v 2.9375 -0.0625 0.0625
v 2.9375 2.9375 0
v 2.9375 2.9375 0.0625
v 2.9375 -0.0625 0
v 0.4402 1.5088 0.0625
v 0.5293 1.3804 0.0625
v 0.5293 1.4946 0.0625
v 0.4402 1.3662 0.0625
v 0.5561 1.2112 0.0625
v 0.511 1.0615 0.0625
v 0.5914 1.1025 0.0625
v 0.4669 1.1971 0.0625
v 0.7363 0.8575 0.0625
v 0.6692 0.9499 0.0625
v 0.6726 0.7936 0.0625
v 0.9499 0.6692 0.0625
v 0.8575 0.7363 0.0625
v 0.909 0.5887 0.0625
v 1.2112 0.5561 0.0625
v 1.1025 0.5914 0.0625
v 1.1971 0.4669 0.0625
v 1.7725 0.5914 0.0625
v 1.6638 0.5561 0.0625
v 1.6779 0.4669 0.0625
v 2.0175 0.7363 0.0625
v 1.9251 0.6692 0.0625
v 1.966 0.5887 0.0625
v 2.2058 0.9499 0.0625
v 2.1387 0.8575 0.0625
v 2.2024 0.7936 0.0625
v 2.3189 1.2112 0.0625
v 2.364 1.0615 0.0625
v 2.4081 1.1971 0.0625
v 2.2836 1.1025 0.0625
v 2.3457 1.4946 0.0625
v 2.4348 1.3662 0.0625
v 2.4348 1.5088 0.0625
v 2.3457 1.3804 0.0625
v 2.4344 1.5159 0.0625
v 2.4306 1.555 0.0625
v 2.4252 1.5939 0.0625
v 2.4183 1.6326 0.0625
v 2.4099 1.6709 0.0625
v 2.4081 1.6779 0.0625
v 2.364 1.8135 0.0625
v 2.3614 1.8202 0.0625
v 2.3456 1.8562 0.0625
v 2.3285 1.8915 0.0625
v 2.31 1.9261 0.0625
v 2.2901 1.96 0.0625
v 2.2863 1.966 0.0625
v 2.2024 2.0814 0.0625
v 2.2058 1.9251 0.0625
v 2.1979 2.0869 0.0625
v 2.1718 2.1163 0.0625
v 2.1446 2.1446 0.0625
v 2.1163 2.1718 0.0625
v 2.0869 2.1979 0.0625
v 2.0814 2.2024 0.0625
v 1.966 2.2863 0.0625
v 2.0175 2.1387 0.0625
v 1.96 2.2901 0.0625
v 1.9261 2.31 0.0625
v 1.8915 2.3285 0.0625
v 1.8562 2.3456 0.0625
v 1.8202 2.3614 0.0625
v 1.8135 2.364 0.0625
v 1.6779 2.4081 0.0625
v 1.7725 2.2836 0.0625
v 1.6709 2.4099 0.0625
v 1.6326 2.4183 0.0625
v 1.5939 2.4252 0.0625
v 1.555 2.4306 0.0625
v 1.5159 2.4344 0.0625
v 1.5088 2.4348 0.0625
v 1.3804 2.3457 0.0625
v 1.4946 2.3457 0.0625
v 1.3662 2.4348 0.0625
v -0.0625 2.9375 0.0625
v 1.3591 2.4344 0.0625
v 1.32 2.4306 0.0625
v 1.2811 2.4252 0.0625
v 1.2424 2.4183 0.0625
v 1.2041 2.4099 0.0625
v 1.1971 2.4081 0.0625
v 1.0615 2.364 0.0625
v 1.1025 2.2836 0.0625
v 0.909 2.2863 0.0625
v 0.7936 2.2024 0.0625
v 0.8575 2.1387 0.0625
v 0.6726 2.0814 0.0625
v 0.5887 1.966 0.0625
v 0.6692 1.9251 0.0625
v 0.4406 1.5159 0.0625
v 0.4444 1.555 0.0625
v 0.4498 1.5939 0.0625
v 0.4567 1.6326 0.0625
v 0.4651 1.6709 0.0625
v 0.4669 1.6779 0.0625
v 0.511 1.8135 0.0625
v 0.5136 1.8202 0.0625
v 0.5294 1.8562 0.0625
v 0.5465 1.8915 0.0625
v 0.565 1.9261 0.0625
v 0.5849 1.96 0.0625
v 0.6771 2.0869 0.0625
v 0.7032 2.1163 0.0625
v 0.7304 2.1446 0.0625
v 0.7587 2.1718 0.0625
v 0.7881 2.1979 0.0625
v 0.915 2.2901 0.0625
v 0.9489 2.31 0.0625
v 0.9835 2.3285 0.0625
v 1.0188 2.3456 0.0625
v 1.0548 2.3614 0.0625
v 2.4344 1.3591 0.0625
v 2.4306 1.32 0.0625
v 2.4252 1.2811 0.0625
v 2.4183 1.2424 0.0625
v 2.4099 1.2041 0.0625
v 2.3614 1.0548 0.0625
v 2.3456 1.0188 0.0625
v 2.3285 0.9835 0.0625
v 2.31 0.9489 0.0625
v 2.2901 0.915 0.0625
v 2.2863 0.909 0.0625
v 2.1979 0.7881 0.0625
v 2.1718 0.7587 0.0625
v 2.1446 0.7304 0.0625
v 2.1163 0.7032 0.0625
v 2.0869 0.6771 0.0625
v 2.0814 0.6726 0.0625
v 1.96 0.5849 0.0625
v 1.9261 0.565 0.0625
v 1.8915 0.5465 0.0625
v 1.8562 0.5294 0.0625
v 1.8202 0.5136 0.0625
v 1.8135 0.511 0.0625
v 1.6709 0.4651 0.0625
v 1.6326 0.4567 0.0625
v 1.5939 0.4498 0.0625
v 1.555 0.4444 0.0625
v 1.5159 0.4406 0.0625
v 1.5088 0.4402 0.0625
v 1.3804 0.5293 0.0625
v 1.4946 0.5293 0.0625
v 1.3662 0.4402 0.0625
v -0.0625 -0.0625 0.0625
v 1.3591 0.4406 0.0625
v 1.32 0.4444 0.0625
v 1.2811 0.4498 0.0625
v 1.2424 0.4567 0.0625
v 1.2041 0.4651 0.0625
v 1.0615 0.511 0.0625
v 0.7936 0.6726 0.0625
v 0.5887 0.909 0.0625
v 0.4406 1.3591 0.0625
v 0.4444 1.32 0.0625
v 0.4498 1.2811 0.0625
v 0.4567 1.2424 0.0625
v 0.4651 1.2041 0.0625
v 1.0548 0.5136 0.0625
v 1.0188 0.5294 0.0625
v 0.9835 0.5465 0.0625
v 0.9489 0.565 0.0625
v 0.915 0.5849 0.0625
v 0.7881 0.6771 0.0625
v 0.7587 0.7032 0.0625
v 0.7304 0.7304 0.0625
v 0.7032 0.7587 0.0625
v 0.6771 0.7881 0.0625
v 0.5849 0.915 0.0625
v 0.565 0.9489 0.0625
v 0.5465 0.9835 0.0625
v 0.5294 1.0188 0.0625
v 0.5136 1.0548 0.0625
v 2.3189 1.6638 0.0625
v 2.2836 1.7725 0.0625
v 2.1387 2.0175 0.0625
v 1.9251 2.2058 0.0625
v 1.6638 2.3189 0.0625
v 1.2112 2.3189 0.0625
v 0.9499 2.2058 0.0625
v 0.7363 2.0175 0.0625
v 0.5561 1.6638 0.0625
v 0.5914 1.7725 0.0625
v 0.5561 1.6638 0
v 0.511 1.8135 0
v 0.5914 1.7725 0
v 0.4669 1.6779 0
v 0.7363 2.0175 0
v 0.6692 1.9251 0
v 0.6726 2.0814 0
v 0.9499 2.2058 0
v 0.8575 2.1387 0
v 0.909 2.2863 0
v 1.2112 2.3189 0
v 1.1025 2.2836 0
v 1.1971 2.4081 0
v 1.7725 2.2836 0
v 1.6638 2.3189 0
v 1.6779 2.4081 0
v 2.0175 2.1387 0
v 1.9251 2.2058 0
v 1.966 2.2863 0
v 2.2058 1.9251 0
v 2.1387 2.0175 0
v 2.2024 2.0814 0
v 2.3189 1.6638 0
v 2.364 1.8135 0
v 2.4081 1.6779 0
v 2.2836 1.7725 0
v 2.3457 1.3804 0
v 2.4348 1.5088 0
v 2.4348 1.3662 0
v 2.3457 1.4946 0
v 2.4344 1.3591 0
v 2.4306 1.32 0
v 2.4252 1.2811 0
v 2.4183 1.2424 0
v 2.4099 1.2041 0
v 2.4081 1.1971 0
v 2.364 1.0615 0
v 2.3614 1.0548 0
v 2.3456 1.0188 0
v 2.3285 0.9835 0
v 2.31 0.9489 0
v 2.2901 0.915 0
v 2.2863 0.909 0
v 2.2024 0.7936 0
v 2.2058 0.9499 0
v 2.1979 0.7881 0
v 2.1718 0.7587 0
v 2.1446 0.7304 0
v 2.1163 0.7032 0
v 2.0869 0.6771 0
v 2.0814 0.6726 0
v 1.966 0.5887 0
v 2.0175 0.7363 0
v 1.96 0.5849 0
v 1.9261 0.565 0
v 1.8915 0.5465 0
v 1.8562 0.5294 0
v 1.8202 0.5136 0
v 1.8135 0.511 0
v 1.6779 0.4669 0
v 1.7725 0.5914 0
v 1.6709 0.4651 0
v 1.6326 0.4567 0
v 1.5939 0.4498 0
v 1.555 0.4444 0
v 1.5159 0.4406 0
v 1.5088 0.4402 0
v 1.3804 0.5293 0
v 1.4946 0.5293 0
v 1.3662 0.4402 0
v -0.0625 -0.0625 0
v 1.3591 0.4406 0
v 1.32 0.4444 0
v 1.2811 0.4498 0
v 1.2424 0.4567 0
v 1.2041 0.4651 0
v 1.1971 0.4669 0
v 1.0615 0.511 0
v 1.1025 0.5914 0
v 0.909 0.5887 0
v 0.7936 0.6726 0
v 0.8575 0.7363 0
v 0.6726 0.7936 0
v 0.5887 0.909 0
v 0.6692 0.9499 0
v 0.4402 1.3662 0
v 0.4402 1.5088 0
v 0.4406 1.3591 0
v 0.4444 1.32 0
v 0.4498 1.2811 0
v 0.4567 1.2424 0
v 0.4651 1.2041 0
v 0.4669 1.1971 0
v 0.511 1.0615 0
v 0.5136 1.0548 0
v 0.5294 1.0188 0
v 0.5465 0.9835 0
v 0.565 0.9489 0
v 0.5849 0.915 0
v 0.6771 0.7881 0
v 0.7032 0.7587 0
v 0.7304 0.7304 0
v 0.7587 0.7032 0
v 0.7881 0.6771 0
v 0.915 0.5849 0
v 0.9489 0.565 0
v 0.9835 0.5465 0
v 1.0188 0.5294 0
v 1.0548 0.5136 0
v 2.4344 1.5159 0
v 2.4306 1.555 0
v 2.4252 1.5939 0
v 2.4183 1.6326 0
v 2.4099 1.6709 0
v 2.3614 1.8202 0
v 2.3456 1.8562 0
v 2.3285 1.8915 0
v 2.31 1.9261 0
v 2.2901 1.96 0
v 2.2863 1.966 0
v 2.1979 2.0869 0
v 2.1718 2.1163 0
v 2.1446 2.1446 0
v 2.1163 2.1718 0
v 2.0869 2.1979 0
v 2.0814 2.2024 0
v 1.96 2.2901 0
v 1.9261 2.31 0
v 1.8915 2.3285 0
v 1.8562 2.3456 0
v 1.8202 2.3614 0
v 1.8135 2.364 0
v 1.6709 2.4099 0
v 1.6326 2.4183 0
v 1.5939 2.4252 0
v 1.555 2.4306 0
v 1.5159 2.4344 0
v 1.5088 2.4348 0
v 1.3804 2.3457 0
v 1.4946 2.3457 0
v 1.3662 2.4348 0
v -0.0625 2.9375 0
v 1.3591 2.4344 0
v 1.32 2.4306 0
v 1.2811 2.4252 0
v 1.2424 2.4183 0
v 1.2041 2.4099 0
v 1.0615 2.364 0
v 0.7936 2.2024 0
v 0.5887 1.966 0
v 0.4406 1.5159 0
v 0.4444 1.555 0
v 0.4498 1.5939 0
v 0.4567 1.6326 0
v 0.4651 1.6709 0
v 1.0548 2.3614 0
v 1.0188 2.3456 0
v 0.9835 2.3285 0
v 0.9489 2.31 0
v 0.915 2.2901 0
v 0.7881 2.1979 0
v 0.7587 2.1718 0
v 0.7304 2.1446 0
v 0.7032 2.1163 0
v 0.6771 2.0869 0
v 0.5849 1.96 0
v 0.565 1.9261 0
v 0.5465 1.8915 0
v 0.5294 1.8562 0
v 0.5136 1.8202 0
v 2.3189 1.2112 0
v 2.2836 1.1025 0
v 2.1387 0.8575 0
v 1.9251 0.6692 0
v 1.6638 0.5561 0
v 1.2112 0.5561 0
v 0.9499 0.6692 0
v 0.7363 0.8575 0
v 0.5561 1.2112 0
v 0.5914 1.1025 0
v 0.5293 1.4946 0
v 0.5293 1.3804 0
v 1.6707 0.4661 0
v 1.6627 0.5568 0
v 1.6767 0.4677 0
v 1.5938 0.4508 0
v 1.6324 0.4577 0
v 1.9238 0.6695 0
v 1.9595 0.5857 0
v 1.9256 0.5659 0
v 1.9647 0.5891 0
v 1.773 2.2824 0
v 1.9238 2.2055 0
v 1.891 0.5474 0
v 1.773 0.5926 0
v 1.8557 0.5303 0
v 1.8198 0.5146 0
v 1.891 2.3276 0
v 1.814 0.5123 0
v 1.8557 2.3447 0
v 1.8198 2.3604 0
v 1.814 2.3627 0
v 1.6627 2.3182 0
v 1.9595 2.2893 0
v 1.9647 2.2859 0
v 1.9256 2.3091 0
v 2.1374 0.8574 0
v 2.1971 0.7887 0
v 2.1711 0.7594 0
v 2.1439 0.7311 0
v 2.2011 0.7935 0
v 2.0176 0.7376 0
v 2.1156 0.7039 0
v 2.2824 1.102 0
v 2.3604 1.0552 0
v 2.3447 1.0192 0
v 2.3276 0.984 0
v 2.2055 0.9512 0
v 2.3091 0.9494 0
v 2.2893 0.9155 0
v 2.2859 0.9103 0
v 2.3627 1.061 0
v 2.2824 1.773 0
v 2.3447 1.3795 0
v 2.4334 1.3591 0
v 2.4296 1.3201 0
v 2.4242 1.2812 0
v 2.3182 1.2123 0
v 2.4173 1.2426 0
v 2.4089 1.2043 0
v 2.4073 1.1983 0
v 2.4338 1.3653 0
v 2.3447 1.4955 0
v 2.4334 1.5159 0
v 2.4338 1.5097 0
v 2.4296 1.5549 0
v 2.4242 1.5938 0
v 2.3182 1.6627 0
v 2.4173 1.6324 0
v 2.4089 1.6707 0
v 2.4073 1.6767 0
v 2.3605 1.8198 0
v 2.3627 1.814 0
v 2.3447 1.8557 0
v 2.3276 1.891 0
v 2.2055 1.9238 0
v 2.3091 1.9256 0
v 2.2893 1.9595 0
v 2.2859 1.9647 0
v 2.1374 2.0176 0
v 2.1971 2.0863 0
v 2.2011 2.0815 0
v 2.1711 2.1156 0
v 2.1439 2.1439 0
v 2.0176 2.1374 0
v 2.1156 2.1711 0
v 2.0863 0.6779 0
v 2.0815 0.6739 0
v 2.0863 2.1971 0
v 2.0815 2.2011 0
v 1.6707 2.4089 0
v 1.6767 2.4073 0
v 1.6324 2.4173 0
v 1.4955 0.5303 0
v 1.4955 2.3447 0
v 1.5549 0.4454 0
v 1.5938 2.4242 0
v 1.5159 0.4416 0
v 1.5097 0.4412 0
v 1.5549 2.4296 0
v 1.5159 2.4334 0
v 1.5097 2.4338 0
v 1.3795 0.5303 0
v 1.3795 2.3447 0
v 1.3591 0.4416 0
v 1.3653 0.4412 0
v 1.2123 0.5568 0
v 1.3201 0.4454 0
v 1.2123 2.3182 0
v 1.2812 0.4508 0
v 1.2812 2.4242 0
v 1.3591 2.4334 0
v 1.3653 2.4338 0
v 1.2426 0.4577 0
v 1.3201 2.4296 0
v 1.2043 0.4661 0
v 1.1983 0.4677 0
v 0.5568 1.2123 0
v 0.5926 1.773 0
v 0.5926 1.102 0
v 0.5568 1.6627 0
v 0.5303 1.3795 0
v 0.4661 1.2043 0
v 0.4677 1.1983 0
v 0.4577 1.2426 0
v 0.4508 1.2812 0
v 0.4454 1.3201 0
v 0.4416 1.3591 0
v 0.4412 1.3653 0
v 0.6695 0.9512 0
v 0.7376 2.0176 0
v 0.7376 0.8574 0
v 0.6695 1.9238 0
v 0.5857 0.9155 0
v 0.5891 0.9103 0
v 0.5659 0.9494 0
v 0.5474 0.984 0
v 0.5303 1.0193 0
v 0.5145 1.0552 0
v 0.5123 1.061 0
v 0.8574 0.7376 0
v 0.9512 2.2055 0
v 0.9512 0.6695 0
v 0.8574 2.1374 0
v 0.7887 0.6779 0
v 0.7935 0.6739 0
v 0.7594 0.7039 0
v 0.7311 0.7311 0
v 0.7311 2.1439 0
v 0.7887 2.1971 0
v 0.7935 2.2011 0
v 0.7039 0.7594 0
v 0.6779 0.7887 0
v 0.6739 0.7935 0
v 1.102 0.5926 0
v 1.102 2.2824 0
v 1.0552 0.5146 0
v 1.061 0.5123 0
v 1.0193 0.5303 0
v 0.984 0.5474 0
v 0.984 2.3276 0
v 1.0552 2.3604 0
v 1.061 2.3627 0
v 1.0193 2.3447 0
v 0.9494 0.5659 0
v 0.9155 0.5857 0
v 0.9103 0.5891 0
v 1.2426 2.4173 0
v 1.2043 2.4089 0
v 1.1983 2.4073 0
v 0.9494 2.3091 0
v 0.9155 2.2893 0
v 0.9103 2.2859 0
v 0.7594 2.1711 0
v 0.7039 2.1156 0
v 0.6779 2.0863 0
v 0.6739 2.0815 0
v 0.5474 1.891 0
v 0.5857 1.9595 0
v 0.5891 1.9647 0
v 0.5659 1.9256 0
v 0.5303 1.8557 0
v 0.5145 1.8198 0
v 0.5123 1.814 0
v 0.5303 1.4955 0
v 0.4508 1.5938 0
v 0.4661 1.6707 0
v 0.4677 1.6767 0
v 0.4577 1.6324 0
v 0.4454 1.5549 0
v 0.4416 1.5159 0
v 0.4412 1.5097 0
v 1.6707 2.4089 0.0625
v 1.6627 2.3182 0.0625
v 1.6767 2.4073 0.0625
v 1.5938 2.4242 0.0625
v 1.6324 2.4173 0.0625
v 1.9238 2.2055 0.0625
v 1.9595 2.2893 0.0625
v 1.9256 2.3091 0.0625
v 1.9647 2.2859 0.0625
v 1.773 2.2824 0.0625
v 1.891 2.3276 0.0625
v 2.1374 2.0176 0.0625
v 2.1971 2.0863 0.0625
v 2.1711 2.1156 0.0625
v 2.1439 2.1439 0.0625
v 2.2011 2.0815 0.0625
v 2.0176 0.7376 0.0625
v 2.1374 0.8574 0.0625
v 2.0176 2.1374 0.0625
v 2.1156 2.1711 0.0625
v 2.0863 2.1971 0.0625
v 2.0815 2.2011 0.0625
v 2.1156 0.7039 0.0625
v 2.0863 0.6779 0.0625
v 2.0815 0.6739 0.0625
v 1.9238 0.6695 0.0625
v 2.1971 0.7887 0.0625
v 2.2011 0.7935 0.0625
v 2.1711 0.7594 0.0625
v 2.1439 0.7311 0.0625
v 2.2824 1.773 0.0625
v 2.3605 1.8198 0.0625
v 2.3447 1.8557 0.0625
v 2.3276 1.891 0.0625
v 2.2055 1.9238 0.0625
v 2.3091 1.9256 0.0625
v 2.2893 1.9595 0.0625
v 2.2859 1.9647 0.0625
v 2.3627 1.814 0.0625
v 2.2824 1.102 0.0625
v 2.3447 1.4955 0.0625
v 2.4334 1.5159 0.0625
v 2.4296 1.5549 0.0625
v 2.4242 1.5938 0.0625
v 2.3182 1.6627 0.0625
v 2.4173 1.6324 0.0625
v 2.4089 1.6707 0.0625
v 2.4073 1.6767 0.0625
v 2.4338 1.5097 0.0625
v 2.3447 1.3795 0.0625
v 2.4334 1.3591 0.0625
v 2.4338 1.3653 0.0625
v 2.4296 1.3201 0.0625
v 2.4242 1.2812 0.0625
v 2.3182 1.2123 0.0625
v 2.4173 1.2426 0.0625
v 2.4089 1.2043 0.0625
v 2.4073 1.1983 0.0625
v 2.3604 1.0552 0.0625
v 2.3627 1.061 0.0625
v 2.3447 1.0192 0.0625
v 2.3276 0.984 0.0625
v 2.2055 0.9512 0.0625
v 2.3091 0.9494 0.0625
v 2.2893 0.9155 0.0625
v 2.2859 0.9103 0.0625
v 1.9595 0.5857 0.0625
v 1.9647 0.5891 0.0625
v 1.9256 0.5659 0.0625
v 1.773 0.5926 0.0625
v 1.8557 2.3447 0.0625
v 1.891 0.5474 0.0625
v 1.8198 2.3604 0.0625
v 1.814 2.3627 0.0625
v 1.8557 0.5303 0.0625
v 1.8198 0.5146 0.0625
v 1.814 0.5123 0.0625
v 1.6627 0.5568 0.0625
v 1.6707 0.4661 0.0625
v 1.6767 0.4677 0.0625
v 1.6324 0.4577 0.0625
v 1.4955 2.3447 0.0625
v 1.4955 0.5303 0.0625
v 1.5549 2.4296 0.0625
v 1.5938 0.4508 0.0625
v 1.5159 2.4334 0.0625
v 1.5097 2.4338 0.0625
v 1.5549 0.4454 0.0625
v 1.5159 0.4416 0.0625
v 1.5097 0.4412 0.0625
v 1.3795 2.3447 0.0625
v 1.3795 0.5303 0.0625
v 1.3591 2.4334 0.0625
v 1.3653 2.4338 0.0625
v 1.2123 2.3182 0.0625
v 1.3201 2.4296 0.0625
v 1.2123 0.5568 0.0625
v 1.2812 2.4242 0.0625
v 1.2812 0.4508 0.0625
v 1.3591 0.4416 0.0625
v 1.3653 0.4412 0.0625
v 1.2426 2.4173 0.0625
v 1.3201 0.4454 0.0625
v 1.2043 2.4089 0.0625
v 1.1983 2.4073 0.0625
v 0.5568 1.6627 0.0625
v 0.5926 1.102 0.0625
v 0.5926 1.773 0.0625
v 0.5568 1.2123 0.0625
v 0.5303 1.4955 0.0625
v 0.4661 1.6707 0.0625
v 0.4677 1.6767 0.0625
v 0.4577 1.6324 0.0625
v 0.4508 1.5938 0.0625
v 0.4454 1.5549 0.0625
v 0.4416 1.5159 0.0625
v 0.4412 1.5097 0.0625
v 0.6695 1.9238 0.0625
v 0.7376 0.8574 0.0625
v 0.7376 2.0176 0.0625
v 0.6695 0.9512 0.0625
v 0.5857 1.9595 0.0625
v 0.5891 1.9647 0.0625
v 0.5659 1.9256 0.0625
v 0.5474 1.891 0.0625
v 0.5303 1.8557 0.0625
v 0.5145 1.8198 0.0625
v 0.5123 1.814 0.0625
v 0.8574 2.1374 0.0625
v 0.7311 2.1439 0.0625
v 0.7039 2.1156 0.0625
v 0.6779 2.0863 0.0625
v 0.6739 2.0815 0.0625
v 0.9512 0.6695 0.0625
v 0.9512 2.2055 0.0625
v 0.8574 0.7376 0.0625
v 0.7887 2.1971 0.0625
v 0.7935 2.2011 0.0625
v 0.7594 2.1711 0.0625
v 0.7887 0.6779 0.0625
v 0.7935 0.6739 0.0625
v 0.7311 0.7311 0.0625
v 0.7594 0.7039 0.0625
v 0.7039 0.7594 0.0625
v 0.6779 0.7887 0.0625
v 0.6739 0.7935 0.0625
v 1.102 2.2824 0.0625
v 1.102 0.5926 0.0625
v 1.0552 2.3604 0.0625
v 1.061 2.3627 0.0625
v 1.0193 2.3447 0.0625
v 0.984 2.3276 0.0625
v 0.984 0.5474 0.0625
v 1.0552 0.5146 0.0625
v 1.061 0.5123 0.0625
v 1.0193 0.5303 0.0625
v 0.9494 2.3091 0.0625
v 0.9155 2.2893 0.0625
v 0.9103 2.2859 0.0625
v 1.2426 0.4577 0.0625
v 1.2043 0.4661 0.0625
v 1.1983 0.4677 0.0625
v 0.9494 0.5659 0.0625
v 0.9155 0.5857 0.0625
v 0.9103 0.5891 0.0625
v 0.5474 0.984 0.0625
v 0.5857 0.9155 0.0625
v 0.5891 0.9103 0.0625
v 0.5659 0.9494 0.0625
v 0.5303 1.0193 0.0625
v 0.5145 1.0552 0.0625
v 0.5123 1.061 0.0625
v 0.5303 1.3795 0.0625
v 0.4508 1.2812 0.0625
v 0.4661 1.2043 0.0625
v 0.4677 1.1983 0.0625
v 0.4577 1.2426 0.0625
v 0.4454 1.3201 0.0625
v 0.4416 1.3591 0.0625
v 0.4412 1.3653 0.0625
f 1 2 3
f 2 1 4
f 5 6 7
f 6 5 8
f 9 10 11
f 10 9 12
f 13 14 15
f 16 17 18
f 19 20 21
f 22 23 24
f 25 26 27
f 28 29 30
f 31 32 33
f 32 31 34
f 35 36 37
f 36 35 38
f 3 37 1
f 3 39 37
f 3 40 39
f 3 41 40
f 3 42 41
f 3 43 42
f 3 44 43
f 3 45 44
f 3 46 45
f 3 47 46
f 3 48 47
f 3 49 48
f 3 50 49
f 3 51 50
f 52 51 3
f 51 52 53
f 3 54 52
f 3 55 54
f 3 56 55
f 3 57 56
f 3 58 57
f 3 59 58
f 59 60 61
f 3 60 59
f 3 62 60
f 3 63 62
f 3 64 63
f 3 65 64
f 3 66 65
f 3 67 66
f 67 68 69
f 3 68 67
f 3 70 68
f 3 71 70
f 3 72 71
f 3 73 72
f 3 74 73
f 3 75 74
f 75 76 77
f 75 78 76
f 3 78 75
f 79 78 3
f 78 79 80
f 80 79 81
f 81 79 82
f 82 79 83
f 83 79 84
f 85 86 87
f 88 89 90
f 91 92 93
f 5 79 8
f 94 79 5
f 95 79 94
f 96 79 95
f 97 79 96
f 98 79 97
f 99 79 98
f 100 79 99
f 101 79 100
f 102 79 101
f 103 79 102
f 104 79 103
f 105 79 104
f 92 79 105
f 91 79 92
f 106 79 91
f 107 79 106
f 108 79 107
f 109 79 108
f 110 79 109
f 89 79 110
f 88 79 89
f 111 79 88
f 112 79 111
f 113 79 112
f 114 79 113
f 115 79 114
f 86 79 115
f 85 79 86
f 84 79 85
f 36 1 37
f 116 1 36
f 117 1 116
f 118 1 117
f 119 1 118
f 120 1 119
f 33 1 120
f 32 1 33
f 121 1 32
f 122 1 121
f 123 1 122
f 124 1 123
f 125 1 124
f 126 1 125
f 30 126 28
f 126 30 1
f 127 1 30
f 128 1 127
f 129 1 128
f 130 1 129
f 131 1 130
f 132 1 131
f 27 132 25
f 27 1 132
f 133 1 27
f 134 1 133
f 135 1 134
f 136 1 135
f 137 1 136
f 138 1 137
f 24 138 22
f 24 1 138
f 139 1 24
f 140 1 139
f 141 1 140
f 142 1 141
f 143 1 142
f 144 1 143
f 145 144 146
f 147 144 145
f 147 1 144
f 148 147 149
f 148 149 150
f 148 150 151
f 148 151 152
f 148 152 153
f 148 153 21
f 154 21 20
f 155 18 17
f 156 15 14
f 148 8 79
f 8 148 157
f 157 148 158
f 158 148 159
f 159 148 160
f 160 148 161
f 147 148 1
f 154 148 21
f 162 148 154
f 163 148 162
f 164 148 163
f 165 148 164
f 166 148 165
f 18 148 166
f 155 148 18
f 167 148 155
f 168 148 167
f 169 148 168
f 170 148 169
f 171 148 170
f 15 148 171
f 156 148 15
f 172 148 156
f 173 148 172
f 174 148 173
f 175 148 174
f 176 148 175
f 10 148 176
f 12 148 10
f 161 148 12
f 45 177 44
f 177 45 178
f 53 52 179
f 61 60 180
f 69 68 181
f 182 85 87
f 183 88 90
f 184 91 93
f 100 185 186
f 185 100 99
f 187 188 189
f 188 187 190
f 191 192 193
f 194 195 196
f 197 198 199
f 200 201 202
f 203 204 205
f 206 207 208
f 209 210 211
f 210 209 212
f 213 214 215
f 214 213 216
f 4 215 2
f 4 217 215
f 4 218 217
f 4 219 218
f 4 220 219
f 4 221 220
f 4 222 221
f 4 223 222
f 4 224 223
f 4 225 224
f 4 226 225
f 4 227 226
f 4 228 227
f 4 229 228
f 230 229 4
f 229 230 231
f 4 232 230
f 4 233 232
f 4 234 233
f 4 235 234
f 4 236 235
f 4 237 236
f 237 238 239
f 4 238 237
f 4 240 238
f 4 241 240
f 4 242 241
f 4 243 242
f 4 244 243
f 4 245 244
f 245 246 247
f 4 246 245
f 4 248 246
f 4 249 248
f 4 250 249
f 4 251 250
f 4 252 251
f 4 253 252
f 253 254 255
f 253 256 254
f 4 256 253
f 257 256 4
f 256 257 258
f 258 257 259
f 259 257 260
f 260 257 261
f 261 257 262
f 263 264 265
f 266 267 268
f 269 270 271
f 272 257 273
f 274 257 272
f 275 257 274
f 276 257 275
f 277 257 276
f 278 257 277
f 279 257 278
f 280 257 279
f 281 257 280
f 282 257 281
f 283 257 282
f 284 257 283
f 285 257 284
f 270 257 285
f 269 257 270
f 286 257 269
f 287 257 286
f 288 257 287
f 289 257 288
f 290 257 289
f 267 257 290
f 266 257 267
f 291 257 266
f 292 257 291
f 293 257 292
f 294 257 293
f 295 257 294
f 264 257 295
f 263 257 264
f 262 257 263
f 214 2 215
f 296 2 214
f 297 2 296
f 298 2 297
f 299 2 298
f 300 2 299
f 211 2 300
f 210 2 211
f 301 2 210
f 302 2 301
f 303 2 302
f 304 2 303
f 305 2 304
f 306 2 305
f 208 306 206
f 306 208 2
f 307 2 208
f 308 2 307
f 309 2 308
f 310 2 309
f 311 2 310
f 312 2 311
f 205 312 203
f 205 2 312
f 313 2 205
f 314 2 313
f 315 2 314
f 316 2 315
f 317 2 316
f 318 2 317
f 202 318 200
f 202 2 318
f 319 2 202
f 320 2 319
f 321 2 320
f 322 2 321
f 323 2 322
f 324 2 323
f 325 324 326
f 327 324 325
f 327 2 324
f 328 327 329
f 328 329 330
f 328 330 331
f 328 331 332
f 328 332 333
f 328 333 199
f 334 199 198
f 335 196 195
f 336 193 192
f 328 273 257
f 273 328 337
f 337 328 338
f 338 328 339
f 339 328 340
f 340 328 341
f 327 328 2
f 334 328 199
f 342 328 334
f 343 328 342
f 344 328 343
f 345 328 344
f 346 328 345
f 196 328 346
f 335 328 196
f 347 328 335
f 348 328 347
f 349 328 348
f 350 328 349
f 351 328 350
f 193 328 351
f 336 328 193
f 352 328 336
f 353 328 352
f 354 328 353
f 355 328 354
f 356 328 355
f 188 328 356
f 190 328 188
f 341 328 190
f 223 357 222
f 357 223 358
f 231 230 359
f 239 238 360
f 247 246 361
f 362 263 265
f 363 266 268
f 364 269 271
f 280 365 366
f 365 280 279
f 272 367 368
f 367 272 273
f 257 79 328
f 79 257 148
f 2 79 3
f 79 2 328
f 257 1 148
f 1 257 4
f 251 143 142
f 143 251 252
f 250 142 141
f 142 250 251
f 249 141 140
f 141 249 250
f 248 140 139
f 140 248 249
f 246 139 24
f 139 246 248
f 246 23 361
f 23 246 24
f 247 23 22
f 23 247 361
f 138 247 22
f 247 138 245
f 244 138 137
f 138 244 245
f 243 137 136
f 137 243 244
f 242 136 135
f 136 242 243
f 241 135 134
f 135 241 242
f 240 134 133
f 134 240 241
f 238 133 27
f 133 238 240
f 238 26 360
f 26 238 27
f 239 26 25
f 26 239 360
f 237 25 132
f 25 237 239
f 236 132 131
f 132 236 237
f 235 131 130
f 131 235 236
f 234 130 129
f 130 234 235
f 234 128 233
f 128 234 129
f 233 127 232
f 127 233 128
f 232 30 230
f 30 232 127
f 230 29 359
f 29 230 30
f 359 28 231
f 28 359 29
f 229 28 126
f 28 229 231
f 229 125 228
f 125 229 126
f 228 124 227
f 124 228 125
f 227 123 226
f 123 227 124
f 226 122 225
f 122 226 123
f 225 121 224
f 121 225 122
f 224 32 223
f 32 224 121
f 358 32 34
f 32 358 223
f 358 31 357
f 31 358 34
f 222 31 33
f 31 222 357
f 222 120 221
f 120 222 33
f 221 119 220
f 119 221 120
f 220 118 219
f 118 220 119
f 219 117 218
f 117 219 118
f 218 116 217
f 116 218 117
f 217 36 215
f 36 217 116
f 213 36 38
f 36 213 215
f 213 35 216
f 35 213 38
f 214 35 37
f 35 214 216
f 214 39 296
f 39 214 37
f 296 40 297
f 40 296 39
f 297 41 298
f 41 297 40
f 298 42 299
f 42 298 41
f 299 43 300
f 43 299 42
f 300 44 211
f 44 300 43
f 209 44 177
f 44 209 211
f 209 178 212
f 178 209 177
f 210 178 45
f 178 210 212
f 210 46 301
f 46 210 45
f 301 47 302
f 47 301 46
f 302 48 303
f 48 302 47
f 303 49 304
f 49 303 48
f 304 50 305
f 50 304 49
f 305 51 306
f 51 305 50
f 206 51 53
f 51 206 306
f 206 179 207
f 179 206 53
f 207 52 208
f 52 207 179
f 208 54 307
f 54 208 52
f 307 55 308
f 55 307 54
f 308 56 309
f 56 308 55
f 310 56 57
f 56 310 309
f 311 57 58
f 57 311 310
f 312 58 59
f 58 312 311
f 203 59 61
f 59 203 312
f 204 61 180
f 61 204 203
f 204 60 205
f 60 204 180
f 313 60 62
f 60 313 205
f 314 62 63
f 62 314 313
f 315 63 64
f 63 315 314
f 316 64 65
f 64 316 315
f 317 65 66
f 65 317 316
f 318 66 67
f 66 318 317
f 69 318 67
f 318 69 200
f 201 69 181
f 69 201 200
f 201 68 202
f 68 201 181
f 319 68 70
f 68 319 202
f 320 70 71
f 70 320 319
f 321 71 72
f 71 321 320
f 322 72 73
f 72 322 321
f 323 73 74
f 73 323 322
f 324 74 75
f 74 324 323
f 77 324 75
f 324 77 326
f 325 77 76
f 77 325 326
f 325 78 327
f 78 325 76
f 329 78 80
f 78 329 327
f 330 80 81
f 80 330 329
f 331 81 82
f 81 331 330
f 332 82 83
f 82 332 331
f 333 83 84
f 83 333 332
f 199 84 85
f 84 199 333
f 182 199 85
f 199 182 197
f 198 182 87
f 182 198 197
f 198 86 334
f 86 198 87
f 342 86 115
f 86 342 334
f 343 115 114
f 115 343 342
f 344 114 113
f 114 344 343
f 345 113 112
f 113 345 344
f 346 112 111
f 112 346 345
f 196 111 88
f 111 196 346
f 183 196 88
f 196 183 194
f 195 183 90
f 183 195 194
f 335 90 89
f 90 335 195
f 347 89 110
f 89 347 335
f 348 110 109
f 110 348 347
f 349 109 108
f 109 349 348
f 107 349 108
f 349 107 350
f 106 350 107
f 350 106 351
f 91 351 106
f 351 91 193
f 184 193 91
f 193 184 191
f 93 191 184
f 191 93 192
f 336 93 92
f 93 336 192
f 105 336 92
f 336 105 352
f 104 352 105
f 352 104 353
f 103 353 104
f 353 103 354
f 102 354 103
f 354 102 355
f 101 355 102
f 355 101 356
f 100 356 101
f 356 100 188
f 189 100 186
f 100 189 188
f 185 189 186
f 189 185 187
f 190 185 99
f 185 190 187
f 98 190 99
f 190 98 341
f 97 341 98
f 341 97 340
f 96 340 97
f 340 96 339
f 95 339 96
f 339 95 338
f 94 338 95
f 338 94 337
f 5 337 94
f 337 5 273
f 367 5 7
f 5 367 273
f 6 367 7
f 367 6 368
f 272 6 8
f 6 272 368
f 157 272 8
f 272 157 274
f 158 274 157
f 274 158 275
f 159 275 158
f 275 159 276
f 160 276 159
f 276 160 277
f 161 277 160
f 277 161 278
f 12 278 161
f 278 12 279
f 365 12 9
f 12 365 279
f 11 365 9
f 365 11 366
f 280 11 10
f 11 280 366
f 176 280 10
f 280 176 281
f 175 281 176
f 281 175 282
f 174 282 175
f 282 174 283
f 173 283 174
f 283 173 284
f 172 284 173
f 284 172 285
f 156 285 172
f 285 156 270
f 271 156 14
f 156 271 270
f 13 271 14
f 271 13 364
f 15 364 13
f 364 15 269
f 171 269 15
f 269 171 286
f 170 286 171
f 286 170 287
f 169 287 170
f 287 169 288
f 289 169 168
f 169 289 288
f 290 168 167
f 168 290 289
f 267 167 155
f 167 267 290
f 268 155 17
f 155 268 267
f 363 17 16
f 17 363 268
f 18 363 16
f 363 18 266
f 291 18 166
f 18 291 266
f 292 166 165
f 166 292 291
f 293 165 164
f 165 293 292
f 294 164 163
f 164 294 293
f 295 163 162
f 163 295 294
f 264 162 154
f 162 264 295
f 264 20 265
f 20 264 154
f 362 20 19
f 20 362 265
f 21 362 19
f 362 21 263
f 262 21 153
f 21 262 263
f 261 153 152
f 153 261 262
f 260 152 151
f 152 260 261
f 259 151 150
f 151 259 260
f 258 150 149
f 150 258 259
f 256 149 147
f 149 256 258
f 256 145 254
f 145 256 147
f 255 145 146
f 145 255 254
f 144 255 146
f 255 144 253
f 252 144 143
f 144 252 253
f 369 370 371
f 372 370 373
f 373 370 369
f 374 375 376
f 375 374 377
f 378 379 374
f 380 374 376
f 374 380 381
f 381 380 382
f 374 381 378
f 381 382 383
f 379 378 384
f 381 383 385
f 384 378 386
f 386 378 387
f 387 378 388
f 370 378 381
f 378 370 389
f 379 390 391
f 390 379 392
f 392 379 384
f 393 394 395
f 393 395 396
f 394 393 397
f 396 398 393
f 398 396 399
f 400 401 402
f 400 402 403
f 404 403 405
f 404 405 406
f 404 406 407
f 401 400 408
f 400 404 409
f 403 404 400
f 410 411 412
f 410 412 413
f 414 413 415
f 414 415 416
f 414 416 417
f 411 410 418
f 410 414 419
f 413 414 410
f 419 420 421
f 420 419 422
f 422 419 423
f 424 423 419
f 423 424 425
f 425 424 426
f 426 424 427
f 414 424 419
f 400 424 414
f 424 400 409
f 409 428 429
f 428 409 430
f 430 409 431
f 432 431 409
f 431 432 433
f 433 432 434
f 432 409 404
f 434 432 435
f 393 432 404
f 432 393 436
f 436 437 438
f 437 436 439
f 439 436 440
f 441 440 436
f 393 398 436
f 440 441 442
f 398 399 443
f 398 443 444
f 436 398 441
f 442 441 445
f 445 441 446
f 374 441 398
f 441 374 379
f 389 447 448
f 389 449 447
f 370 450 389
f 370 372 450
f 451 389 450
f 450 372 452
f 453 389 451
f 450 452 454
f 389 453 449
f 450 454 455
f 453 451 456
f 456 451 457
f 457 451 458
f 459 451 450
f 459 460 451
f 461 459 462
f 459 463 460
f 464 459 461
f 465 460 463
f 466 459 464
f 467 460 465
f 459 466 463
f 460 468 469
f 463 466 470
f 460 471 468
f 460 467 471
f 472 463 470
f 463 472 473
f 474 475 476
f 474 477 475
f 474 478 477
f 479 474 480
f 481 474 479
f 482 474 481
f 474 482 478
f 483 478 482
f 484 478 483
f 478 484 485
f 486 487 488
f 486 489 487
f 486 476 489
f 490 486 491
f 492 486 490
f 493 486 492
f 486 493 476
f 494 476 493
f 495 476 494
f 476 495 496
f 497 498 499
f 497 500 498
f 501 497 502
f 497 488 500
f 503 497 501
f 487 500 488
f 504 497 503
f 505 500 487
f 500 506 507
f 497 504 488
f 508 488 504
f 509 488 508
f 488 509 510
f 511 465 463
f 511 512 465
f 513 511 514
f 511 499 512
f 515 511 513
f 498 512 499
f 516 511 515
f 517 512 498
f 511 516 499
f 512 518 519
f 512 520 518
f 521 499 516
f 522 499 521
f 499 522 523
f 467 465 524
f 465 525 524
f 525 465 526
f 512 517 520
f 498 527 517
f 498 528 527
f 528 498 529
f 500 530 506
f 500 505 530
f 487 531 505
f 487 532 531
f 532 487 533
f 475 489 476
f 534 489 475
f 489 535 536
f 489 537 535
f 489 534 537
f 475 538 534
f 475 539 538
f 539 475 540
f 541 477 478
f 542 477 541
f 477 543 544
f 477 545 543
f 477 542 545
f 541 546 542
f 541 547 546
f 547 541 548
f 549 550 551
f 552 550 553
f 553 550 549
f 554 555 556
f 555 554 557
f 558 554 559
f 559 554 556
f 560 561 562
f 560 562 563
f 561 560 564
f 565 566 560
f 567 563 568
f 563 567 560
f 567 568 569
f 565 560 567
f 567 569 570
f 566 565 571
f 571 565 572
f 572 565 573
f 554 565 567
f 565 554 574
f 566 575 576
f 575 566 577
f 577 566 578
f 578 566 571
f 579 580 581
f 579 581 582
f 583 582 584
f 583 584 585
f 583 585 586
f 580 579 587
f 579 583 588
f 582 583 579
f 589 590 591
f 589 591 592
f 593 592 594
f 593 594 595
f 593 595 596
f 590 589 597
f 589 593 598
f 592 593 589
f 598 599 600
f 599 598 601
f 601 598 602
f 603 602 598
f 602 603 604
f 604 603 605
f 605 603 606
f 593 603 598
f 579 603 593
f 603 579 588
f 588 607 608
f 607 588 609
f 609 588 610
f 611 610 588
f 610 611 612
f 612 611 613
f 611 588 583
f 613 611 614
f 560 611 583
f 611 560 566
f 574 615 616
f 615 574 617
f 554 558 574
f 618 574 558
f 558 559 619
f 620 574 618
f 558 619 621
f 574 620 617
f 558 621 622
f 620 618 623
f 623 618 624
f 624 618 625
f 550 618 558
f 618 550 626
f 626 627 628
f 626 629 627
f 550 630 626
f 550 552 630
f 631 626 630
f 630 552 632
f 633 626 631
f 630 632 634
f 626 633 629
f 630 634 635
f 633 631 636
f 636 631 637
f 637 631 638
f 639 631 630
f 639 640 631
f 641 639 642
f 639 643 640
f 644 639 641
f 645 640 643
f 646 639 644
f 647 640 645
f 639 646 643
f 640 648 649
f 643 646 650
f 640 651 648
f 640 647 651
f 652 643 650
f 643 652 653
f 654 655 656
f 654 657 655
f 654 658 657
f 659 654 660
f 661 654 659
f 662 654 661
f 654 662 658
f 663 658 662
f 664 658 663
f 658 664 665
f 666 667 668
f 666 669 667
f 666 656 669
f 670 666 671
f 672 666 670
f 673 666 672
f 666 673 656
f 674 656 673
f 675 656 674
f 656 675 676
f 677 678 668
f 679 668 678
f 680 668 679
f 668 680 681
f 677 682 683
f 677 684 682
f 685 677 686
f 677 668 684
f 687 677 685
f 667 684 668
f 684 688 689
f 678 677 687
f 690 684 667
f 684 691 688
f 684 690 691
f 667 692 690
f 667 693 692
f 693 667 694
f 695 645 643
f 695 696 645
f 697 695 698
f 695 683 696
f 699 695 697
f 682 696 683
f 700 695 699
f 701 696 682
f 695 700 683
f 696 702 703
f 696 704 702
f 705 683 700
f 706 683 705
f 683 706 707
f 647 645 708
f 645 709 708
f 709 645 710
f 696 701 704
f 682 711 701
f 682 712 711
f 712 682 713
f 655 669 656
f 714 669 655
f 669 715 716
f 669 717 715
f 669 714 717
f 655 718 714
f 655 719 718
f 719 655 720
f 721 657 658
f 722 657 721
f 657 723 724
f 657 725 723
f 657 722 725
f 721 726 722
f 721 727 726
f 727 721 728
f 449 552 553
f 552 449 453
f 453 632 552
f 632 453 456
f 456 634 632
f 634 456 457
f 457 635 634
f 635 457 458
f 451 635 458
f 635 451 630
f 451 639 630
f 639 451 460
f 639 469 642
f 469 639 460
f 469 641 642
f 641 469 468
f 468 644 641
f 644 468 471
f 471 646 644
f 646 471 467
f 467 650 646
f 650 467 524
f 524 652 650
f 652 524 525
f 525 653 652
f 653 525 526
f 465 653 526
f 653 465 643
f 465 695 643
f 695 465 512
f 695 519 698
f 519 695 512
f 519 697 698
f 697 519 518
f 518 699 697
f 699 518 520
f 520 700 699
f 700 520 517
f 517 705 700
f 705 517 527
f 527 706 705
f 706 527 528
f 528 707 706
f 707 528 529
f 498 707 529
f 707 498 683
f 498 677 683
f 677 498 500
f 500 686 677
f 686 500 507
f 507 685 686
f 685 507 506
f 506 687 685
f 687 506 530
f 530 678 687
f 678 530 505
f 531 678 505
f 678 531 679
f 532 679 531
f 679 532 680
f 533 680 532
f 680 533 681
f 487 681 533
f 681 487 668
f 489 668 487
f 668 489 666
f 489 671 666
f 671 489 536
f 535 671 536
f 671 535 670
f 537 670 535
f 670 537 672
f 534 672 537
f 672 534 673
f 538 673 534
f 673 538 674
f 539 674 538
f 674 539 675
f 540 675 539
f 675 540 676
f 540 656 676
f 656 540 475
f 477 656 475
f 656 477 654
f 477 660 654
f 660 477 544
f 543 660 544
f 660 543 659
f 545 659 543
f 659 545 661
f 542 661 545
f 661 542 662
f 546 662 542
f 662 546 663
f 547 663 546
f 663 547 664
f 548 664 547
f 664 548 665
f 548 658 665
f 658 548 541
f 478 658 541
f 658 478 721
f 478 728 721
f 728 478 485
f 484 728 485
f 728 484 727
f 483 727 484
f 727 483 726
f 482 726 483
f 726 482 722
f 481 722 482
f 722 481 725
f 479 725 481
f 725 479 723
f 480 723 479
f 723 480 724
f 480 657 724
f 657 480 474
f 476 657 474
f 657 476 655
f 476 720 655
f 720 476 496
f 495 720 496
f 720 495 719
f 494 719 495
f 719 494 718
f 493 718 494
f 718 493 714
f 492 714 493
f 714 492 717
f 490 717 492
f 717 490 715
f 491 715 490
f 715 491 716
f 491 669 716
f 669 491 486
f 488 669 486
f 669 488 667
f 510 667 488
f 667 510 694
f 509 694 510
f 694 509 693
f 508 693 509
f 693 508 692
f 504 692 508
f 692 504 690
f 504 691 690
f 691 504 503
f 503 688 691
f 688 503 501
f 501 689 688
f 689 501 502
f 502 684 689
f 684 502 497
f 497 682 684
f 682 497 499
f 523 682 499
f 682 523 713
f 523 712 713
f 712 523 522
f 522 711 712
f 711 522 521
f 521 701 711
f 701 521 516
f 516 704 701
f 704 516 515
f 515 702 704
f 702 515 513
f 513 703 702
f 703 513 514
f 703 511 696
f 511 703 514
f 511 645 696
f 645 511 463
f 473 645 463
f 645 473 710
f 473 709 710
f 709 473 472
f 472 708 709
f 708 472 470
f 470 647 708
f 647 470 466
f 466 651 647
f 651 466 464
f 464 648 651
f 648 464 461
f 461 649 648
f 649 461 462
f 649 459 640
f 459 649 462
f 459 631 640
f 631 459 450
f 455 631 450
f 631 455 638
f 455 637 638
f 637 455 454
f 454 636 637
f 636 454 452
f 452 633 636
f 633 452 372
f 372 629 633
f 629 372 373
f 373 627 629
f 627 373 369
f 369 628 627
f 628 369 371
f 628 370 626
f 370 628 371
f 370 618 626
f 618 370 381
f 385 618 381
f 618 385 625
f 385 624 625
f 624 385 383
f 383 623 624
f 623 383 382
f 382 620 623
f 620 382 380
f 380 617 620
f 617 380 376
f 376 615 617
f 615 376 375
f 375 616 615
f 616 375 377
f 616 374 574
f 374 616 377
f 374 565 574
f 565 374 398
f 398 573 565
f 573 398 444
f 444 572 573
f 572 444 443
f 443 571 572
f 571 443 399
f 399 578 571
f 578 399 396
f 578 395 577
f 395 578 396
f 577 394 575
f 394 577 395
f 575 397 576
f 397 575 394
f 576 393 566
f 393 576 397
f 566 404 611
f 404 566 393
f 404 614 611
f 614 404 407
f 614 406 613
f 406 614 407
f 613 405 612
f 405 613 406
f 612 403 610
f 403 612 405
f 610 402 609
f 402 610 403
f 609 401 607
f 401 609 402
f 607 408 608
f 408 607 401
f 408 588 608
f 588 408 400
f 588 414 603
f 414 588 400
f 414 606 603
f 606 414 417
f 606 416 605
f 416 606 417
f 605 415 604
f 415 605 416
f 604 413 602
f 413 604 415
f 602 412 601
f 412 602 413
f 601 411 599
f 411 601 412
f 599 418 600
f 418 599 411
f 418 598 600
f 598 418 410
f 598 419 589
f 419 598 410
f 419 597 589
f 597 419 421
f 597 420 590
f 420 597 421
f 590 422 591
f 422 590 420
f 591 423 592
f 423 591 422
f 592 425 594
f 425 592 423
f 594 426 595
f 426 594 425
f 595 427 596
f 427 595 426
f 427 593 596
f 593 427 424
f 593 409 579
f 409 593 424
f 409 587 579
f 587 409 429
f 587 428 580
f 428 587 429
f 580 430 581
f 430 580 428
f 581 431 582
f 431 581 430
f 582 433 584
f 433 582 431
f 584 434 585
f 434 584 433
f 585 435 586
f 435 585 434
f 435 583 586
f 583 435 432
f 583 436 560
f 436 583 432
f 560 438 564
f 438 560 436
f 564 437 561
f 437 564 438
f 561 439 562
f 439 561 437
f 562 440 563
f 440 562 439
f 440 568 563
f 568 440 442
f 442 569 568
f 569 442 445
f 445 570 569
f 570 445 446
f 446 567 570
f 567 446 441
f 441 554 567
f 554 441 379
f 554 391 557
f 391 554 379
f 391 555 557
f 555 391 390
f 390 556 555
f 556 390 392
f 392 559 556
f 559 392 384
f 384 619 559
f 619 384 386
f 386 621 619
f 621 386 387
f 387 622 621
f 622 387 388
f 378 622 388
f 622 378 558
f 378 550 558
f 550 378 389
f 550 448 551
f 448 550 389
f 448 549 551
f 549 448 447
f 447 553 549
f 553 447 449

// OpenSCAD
// file: sub_innergears.scad
// sub_innergears.scad — shared inner gear ring (ring with inward-pointing teeth)
// Requires caller to define: plate_w, plate_d, plate_h (see sub_base_plate.scad)
// Units: inches
//
// Usage — must be `include`, positioned after sub_base_plate.scad and before any
// code that references gear_r_tip/gear_r_root/gear_r_bore:
//   include <sub_base_plate.scad>
//   include <sub_innergears.scad>
//   gear("darkred");
//   gear_bore("lightgray");
//
// gear(c) and gear_bore(c) take a color string so tiles with different gear
// colors (e.g. darkred vs darkgreen) can share this same file.

gear_r_tip  = 1.18;   // outer edge of ring (plain)
gear_r_root = 1.00;   // ring inner edge; teeth root here
gear_r_bore = 0.82;   // bore radius / tooth tip depth
gear_n      = 20;
tooth_hw    = 4.5;
tooth_tip_f = 0.80;

// ── Gear 2D helpers ───────────────────────────────────────────────────────────

module gear_tooth_2d() {
    shift   = (gear_r_root - gear_r_bore) / 2;
    r_outer = gear_r_root + shift;
    r_inner = gear_r_bore + shift;
    polygon([
        [r_outer * cos(-tooth_hw),               r_outer * sin(-tooth_hw)],
        [r_inner * cos(-tooth_hw * tooth_tip_f),  r_inner * sin(-tooth_hw * tooth_tip_f)],
        [r_inner * cos( tooth_hw * tooth_tip_f),  r_inner * sin( tooth_hw * tooth_tip_f)],
        [r_outer * cos( tooth_hw),               r_outer * sin( tooth_hw)],
    ]);
}

module gear_2d() {
    circle(r = gear_r_tip, $fn = 160);
}

module bore_2d() {
    pitch = 360 / gear_n;
    difference() {
        circle(r = gear_r_root, $fn = 160);
        for (i = [0:gear_n - 1]) rotate([0, 0, i * pitch]) gear_tooth_2d();
    }
}

// ── Gear holes & gear ────────────────────────────────────────────────────────

module gear_holes() {
    translate([plate_w / 2, plate_d / 2, -1])
    linear_extrude(plate_h + 2)
    difference() {
        gear_2d();
        bore_2d();
    }
}

module gear(c) {
    color(c)
    translate([plate_w / 2, plate_d / 2, 0])
    linear_extrude(plate_h)
    difference() { gear_2d(); bore_2d(); }
}

// ── Gear bore hole & gear bore ────────────────────────────────────────────────

module gear_bore_holes() {
    translate([plate_w / 2, plate_d / 2, -1])
    linear_extrude(plate_h + 2)
    bore_2d();
}

module gear_bore(c) {
    color(c)
    translate([plate_w / 2, plate_d / 2, 0])
    linear_extrude(plate_h)
    offset(delta = -0.001) bore_2d();
}
// file: sub_base_plate.scad
// sub_base_plate.scad — shared tile-building blocks: plate, rivets, edge ID marks,
// and the common plate/hole dimensional constants used by every tile.
// Units: inches
//
// Usage — must be `include`, not `use`, and the include line must come
// before any code in the caller that references plate_w/plate_d/plate_h/
// frame_w/hole_d/hole_r: a variable defined only inside an included file is
// invisible to code positioned before the include statement.
//   include <sub_base_plate.scad>
//   plate(["red", undef, "blue", undef, undef, "green"]);
//
// plate(colors) is the main entry point: it builds the complete base tile in
// one call — the frame with edge ID marks, the darkgray plate, and the
// lightgray rivet ring (40 rivets, 10 per side, corners shared). colors is the
// same 6-slot frame_with_id() array described below.
//
// frame_with_id() colors are applied left-to-right (−x to +x), repeated
// identically on all four edges. Bottom and right edges read the array in
// reverse (slot 5-i) so the pattern stays consistent when the tile is flipped.
// Any position left as undef or omitted defaults to black. 6 regions span the
// straight run of each edge (corners always stay solid black). A thin black
// layer covers the marks on the top face; marks are visible from the edge.

plate_w = 2 + 7/8;
plate_d = 2 + 7/8;
plate_h = 1/16;
frame_w = 1/16;
hole_d  = 3/32;
hole_r  = hole_d / 2;

module rivet_holes() {
    spacing_x = plate_w / 10;
    spacing_y = plate_d / 10;
    inset_x   = spacing_x / 2;
    inset_y   = spacing_y / 2;
    for (i = [0:9]) translate([inset_x + i * spacing_x, inset_y,           -1]) cylinder(h = plate_h + 2, r = hole_r, $fn = 20);
    for (i = [0:9]) translate([inset_x + i * spacing_x, plate_d - inset_y, -1]) cylinder(h = plate_h + 2, r = hole_r, $fn = 20);
    for (i = [0:9]) translate([inset_x,           inset_y + i * spacing_y, -1]) cylinder(h = plate_h + 2, r = hole_r, $fn = 20);
    for (i = [0:9]) translate([plate_w - inset_x, inset_y + i * spacing_y, -1]) cylinder(h = plate_h + 2, r = hole_r, $fn = 20);
}

module rivets() {
    spacing_x = plate_w / 10;
    spacing_y = plate_d / 10;
    inset_x   = spacing_x / 2;
    inset_y   = spacing_y / 2;
    color("lightgray") {
        for (i = [0:9]) translate([inset_x + i * spacing_x, inset_y,           0]) cylinder(h = plate_h, r = hole_r, $fn = 20);
        for (i = [0:9]) translate([inset_x + i * spacing_x, plate_d - inset_y, 0]) cylinder(h = plate_h, r = hole_r, $fn = 20);
        for (i = [0:9]) translate([inset_x,           inset_y + i * spacing_y, 0]) cylinder(h = plate_h, r = hole_r, $fn = 20);
        for (i = [0:9]) translate([plate_w - inset_x, inset_y + i * spacing_y, 0]) cylinder(h = plate_h, r = hole_r, $fn = 20);
    }
}

module frame_with_id(colors = []) {
    id_cover = plate_h / 8;
    region_w = plate_w / 6;
    region_d = plate_d / 6;
    mark_h   = plate_h - id_cover;

    color("black")
    difference() {
        translate([-frame_w, -frame_w, 0])
            cube([plate_w + 2 * frame_w, plate_d + 2 * frame_w, plate_h]);
        translate([0, 0, -0.001])
            cube([plate_w, plate_d, plate_h + 0.002]);
        // top/bottom/left/right straight runs only — corners stay solid black
        translate([0, plate_d - 0.001, -0.001])
            cube([plate_w, frame_w + 0.002, plate_h + 0.002]);
        translate([0, -frame_w - 0.001, -0.001])
            cube([plate_w, frame_w + 0.002, plate_h + 0.002]);
        translate([-frame_w - 0.001, 0, -0.001])
            cube([frame_w + 0.002, plate_d, plate_h + 0.002]);
        translate([plate_w - 0.001, 0, -0.001])
            cube([frame_w + 0.002, plate_d, plate_h + 0.002]);
    }

    for (i = [0:5]) {
        c     = (colors[i] != undef) ? colors[i] : "black";

        // top edge
        color(c) translate([i * region_w, plate_d, 0]) cube([region_w, frame_w, mark_h]);
        color("black") translate([i * region_w, plate_d, mark_h]) cube([region_w, frame_w, id_cover]);

        // bottom edge (reversed)
        color(c) translate([(5-i) * region_w, -frame_w, 0]) cube([region_w, frame_w, mark_h]);
        color("black") translate([(5-i) * region_w, -frame_w, mark_h]) cube([region_w, frame_w, id_cover]);

        // left edge
        color(c) translate([-frame_w, i * region_d, 0]) cube([frame_w, region_d, mark_h]);
        color("black") translate([-frame_w, i * region_d, mark_h]) cube([frame_w, region_d, id_cover]);

        // right edge (reversed)
        color(c) translate([plate_w, (5-i) * region_d, 0]) cube([frame_w, region_d, mark_h]);
        color("black") translate([plate_w, (5-i) * region_d, mark_h]) cube([frame_w, region_d, id_cover]);
    }
}

module plate(colors = []) {
    frame_with_id(colors);
    union() {
        difference() {
            color("darkgray") cube([plate_w, plate_d, plate_h]);
            rivet_holes();
        }
        rivets();
    }
}
// file: sub_element110.scad
// sub_element110.scad — shared assembly for element110 gear tile variants
// Requires caller to define: plate_colors (6-slot frame color array),
// label_num (digit painted in the gear bore)
// Units: inches

include <sub_base_plate.scad>
include <sub_innergears.scad>

// ── Label hole → label ────────────────────────────────────────────────────────

module label_holes(num) {
    translate([plate_w / 2, plate_d / 2, -0.001])
    linear_extrude(plate_h + 0.002)
    text(str(num), size = 1.1, halign = "center", valign = "center",
         font = "Liberation Sans:style=Bold");
}

module label(num, clr) {
    color(clr)
    translate([plate_w / 2, plate_d / 2, 0])
    linear_extrude(plate_h)
    text(str(num), size = 1.1, halign = "center", valign = "center",
         font = "Liberation Sans:style=Bold");
}

// ── Assembly ──────────────────────────────────────────────────────────────────
// Each level: difference() cuts the holes INTO the running assembly,
//             union() then adds the feature that fills those holes.
// Innermost = first step; outermost = last step.

union() {                                           // step 4: add label
    difference() {
        union() {                                   // step 3: add gear bore
            difference() {
                union() {                           // step 2: add gear
                    difference() {
                        plate(plate_colors);   // step 1: plate (frame + rivets)
                        gear_holes();
                    }
                    gear("darkgreen");
                }
                gear_bore_holes();
            }
            gear_bore("lightgray");
        }
        label_holes(label_num);
    }
    label(label_num, "green");
}
// main file
// element110-2.scad
// Gear tile variant — number "2" in the bore.
// Units: inches

plate_colors = ["green", undef, "green", "green", "green", "green"];
label_num    = 2;

include <sub_element110.scad>
